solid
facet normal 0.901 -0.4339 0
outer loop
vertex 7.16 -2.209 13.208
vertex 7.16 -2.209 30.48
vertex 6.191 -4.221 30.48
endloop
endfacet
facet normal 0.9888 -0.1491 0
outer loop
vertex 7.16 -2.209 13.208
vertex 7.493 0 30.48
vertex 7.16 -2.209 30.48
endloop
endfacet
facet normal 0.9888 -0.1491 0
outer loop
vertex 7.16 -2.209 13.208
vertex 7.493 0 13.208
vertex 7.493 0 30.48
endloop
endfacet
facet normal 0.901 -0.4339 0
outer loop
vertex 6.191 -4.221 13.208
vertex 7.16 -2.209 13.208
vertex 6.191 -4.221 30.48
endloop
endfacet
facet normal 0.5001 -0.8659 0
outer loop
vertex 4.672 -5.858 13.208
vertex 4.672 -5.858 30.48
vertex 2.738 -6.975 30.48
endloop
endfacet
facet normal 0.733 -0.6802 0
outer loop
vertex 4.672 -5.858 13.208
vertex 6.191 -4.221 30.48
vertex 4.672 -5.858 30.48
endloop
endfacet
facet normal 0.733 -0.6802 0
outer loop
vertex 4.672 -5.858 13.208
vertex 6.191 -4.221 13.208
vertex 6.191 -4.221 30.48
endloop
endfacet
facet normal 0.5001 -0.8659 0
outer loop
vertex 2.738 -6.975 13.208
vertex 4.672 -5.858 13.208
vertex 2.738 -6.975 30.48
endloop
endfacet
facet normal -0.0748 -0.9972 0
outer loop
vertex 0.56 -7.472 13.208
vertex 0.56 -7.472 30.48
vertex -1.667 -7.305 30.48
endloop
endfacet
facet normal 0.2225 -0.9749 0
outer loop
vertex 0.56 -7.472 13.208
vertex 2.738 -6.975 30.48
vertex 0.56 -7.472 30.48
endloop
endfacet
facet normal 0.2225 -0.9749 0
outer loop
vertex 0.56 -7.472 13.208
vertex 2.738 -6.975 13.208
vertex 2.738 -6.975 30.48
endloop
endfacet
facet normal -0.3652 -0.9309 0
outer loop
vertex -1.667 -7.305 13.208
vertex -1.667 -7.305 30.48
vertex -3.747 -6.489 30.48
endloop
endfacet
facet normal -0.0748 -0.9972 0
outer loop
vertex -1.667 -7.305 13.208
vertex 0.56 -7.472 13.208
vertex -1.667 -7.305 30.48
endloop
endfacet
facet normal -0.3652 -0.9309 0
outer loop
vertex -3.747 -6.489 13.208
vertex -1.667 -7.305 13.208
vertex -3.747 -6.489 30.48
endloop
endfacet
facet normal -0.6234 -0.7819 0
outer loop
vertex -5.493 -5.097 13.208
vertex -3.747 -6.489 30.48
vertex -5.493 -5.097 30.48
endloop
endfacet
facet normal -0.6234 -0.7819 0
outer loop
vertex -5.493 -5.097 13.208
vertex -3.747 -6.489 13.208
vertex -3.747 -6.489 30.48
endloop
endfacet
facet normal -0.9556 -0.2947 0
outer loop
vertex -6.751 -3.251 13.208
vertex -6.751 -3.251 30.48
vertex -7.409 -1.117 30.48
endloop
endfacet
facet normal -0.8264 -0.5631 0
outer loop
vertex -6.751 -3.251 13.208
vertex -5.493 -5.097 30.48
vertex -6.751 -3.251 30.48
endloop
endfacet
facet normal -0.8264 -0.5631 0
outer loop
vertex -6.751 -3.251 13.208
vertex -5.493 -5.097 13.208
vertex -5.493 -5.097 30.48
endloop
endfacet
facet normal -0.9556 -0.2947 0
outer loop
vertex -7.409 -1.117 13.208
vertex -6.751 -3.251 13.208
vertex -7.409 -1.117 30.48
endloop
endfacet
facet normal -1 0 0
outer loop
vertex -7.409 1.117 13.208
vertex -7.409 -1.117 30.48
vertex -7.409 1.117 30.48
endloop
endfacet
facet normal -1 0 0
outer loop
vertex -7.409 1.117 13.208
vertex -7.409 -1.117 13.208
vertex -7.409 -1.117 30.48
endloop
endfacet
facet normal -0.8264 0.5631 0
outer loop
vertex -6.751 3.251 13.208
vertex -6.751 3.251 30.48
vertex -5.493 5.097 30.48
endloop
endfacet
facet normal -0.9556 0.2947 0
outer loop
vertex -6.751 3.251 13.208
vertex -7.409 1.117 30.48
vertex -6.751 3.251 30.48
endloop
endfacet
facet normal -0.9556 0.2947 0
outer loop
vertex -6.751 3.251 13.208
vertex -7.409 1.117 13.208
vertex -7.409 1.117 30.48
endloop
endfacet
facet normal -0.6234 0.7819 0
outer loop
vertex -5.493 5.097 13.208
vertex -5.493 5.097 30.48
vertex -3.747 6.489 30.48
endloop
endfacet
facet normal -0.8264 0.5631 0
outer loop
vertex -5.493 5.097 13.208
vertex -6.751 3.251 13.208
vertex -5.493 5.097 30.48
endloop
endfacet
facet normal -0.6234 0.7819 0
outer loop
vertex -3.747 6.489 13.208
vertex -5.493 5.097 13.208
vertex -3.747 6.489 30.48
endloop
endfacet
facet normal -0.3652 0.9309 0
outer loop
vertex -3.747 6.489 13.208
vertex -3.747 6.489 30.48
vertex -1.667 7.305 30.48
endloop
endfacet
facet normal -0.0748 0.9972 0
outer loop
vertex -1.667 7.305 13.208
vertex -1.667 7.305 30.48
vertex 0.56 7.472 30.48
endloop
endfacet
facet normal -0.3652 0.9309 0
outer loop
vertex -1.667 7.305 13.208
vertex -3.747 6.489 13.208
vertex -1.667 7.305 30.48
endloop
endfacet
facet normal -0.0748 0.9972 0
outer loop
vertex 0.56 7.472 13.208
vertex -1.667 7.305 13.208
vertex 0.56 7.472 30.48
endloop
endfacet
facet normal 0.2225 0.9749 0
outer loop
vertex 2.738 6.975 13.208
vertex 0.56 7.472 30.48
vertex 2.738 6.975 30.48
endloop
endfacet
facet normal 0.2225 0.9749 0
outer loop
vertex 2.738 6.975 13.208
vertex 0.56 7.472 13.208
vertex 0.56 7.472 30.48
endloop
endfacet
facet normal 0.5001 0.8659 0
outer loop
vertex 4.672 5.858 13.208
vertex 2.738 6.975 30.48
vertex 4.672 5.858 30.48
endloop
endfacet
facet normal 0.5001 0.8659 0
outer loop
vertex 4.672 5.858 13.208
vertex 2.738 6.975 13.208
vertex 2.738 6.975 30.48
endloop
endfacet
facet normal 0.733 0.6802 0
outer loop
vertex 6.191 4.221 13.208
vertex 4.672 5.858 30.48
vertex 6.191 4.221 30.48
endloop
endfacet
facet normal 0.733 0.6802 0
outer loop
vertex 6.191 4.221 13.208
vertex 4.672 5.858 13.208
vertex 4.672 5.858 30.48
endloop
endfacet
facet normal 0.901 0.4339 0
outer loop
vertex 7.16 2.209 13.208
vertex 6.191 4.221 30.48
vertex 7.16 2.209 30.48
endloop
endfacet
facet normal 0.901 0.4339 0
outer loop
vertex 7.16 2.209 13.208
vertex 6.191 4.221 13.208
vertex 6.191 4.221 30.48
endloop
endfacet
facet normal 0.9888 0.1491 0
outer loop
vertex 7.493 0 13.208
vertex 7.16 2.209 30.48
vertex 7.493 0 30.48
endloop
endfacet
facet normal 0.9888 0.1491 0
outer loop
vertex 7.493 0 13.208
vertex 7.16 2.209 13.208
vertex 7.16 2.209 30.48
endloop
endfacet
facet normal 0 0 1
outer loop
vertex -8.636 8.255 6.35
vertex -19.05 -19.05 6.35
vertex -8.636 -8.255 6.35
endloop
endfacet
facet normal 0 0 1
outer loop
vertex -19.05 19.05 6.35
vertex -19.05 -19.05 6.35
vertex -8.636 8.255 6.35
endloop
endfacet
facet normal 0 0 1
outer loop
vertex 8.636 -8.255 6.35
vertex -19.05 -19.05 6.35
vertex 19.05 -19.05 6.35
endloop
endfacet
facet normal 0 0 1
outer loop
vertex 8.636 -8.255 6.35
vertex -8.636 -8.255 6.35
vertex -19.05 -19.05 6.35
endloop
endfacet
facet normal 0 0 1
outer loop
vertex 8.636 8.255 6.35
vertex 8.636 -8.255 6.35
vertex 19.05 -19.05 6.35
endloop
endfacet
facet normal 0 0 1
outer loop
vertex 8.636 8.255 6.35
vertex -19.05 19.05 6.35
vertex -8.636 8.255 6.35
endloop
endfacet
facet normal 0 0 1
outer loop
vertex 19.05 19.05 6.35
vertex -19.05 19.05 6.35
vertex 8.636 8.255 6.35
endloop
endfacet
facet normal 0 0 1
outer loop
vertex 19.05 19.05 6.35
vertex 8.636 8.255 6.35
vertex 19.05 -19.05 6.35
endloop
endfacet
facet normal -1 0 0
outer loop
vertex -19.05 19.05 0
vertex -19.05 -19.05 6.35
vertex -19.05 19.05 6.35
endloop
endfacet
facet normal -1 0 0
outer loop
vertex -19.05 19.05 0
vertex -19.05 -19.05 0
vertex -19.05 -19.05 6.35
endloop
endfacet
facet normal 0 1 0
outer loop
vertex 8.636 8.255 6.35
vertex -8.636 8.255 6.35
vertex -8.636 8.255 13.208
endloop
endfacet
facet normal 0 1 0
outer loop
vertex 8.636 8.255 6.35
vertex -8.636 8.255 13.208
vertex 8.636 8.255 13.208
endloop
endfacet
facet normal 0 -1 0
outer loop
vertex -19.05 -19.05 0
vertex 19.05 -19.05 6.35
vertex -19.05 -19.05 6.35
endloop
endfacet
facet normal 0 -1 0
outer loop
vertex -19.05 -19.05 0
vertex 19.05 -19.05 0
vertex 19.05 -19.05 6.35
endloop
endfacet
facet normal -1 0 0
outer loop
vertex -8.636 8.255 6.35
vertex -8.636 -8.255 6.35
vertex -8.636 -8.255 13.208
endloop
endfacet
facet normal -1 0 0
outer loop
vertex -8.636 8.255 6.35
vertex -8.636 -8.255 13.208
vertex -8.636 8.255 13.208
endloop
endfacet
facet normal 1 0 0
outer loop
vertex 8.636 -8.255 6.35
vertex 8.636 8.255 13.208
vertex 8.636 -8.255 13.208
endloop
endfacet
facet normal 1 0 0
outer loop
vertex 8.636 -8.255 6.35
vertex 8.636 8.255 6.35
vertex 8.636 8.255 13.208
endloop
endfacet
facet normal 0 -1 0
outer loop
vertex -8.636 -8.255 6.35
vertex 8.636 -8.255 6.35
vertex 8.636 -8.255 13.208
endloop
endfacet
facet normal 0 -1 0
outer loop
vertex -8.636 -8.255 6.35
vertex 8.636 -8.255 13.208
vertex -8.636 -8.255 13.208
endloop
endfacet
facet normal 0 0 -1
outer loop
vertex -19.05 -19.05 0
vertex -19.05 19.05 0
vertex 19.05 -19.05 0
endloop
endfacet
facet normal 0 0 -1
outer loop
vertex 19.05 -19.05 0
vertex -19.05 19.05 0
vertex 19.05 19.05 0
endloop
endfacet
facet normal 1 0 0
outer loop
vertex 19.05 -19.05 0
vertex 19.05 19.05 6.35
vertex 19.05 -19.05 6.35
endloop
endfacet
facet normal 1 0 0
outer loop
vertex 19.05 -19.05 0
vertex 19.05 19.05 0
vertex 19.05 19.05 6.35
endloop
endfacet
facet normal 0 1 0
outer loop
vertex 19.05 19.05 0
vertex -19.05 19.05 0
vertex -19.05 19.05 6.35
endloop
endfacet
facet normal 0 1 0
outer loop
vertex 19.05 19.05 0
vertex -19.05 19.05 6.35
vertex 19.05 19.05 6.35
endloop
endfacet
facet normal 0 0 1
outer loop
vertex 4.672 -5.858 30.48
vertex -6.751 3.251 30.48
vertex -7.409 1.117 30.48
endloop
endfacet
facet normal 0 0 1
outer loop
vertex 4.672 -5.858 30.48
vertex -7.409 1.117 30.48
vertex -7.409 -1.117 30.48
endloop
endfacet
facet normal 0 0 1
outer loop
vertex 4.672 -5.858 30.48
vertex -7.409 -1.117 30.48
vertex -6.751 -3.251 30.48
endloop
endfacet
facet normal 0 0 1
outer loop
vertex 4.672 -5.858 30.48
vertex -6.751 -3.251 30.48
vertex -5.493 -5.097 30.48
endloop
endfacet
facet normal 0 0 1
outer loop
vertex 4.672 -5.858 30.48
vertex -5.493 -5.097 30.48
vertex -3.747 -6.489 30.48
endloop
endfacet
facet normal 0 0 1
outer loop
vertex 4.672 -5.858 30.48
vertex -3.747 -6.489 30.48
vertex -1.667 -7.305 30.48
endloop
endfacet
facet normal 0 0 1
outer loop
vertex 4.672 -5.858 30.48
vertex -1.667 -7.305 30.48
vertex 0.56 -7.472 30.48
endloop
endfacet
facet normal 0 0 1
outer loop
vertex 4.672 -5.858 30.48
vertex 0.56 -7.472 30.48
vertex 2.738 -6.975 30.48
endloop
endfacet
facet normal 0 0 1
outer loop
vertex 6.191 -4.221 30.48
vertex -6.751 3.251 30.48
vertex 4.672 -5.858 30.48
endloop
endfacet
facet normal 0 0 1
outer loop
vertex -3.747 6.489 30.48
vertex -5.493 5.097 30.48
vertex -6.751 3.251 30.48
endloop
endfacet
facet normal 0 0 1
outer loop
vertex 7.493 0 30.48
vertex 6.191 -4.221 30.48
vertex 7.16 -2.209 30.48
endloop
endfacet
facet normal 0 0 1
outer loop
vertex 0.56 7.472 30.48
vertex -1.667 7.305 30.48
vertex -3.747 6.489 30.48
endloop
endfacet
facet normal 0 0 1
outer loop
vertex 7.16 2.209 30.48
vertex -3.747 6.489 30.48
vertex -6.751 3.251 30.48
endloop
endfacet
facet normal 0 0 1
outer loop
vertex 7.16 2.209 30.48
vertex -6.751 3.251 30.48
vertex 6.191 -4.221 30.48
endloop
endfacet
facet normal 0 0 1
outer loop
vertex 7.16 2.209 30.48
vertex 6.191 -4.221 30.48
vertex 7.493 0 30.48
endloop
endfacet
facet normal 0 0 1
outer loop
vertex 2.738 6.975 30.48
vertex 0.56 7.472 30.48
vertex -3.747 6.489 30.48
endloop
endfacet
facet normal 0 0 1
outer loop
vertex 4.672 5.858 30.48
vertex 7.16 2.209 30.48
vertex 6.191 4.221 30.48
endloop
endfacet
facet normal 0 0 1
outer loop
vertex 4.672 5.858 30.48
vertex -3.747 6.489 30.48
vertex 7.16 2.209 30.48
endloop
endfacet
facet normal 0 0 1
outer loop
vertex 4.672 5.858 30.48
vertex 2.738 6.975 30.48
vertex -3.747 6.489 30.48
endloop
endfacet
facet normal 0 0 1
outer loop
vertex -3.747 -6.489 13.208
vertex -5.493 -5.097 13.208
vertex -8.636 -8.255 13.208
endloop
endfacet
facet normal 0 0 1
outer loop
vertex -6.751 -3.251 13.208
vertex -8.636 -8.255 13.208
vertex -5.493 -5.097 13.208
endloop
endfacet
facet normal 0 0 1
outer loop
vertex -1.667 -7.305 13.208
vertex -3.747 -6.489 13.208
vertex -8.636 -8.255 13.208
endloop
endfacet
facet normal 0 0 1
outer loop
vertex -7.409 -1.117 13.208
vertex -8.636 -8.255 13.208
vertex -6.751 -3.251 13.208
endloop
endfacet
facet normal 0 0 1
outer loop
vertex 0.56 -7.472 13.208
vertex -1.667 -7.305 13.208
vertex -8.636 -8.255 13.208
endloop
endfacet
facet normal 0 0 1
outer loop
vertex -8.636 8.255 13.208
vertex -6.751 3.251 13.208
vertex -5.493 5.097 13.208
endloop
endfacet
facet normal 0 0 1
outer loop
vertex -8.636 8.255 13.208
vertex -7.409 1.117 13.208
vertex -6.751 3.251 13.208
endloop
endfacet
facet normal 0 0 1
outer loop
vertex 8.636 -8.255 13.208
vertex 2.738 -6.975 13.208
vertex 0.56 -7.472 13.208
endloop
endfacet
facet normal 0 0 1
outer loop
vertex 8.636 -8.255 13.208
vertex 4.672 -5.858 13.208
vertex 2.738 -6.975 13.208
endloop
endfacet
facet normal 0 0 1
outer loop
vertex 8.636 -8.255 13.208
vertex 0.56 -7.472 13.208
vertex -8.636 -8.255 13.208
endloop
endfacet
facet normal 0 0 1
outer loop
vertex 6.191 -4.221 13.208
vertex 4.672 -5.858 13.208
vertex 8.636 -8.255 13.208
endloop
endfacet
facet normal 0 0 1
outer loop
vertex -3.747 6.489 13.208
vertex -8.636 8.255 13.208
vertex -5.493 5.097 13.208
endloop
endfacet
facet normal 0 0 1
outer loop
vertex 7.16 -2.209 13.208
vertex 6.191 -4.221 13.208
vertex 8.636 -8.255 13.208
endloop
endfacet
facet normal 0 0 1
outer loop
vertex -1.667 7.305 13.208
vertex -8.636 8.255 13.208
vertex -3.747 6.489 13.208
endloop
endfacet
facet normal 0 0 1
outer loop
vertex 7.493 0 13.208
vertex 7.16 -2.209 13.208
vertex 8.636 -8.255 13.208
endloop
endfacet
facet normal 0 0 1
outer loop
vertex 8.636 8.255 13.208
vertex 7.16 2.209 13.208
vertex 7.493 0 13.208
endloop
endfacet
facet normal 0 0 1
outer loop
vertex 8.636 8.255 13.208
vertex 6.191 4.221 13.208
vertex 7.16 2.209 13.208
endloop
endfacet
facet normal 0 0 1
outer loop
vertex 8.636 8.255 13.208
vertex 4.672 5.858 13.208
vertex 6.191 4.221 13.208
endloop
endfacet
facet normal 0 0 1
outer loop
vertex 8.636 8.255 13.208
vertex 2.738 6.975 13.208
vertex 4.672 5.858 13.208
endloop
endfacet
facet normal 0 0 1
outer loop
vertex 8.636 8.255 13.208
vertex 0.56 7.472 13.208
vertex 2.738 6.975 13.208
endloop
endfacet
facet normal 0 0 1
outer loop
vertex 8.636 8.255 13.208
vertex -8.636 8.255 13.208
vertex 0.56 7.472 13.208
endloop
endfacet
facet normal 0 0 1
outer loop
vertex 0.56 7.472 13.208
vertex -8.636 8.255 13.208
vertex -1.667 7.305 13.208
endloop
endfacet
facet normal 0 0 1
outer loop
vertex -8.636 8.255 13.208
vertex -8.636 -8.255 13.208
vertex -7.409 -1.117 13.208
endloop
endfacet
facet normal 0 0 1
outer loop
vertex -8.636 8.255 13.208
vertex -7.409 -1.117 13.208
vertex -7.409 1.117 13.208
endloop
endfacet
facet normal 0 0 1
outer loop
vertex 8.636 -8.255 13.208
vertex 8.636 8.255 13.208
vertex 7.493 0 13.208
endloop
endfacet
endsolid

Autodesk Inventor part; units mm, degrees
ref_plane "YZ Plane" through (0, 0, 0) normal (1, 0, 0) x (0, 1, 0)
ref_plane "XZ Plane" through (0, 0, 0) normal (0, 1, 0) x (-1, 0, 0)
ref_plane "XY Plane" through (0, 0, 0) normal (0, 0, 1) x (1, 0, 0)
sketch "Sketch1" plane through (0, 0, 0) normal (0, 0, 1) x (1, 0, 0)
  line L0 (19.05, -19.05) -> (-19.05, -19.05)
  line L1 (-19.05, -19.05) -> (-19.05, 19.05)
  line L2 (-19.05, 19.05) -> (19.05, 19.05)
  line L3 (19.05, 19.05) -> (19.05, -19.05)
  point P0 (0, 0)
  point P1 (-19.05, 0)
  point P2 (0, 19.05)
  dimension "d0" = 38.1
  dimension "d1" = 38.1
extrude "Extrusion1" add sketch "Sketch1" along normal blind 6.35
sketch "Sketch2" plane through (0, 0, 6.35) normal (0, 0, 1) x (1, 0, 0)
  line L0 (-19.05, -19.05) -> (-19.05, 19.05) projected
  line L1 (-19.05, 19.05) -> (19.05, 19.05) projected
  line L2 (8.636, -8.255) -> (-8.636, -8.255)
  line L3 (-8.636, -8.255) -> (-8.636, 8.255)
  line L4 (-8.636, 8.255) -> (8.636, 8.255)
  line L5 (8.636, 8.255) -> (8.636, -8.255)
  point P0 (0, 0)
  point P1 (0, 8.255)
  point P2 (0, 19.05)
  point P3 (-8.636, 0)
  point P4 (-19.05, 0)
  dimension "d4" = 17.272
  dimension "d5" = 16.51
extrude "Extrusion2" add sketch "Sketch2" along normal blind 6.858
sketch "Sketch3" plane through (0, 0, 13.208) normal (0, 0, 1) x (1, 0, 0)
  circle A0 centre (0, 0) radius 7.493
  point P0 (0, 0)
  dimension "d8" = 14.986
extrude "Extrusion3" add sketch "Sketch3" along normal blind 17.272
properties part number "Camera - SONY CCD"
